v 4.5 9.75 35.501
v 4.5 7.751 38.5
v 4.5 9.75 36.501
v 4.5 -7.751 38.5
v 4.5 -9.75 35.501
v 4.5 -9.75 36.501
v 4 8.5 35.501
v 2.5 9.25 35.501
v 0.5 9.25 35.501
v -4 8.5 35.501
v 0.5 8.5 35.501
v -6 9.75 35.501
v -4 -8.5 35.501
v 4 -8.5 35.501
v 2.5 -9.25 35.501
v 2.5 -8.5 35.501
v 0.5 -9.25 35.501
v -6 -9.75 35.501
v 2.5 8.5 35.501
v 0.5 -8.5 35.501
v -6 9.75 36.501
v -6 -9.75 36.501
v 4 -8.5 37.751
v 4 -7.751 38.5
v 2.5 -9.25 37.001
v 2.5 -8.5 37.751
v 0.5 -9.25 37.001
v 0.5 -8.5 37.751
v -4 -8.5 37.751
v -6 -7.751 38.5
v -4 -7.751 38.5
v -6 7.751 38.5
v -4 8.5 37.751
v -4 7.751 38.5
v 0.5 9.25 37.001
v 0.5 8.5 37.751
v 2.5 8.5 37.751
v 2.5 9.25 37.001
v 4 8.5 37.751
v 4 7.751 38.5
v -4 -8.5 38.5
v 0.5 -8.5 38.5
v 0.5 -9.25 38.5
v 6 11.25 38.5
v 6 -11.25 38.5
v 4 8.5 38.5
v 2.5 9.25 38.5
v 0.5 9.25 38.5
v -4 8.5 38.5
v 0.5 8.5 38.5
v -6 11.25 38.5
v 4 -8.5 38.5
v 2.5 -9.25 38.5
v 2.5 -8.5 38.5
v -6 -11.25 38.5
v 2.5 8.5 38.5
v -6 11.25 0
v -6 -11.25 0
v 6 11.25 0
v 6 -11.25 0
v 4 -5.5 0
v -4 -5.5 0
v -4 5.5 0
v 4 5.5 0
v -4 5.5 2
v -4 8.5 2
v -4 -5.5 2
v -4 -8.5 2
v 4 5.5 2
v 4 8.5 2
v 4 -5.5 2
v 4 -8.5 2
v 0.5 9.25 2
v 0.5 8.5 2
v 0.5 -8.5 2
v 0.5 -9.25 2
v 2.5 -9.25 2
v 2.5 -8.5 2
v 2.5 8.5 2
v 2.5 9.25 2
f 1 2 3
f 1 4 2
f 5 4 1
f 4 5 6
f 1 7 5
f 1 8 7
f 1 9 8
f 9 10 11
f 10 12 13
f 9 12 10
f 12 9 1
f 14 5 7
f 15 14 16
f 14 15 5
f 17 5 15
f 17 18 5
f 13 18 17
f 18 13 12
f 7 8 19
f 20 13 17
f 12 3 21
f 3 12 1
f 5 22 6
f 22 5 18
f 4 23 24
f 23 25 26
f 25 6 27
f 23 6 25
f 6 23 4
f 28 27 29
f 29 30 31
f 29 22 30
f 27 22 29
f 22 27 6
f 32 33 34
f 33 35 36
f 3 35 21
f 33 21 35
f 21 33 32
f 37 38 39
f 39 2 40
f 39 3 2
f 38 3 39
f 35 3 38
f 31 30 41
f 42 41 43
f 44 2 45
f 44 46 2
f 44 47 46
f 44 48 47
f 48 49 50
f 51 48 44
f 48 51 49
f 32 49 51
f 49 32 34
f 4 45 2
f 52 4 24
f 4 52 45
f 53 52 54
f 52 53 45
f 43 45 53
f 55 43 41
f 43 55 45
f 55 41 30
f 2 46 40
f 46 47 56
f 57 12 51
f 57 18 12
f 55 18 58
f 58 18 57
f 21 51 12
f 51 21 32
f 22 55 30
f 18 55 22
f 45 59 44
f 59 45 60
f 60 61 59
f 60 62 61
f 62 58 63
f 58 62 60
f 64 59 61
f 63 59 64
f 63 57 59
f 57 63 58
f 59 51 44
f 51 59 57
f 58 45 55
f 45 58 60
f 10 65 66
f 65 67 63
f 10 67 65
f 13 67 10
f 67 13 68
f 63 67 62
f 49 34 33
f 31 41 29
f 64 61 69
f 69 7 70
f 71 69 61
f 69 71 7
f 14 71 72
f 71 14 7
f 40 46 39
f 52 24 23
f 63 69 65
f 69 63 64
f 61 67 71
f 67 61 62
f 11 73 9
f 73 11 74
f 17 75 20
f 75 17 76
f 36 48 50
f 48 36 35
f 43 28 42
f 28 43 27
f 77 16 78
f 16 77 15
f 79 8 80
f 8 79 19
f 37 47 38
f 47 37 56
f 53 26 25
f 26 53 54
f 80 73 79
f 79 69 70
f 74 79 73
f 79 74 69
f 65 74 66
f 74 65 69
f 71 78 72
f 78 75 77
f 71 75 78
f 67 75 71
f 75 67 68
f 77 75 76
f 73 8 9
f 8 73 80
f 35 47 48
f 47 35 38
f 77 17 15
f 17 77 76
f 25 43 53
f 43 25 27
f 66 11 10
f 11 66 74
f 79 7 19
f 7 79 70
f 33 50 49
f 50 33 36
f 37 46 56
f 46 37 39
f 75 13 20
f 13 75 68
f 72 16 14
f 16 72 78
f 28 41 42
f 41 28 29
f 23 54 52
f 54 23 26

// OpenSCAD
// Which one would you like to see?
part = "case"; // [case:the case without cap,cap:the cap for the case]

// The width of the (e. g. Arduino) board which should fit into the case (all parameters are in mm)
board_width = 18.5;


// The length of the (e. g. Arduino) board which should fit into the case
board_length = 33.5;

// The thickness of the (e. g. Arduino) board which should fit into the case, must be >= 0. (its used for the thickness of the slots, it is not the size of the inner space
board_thickness = 2.0;

// the board can slide into the case. Therefore there are slots on both sides of the case. If you want the complete inner of the case with same width as above given board with: set this parameter to 0
board_slot_depth = .75;

// if the board should not be centered in the case, you can add an offset here. Positive values give a lower position of the slots
board_out_of_center_Z = 1.5;



// the inner height of the case
case_inner_height = 8;

// on the front there is a centered opening. Typically this is used for connecting the usb conncetor of the board. Set to 0 if you don't need a openening there
USB_openening_height = 8;
USB_openening_width = 11;



// the cap is made a little bit smaller and thinner than the cap slot in the case, must be >= 0 (in mm)
gap = 0.2;

// in the cap there is a slot, e. g. for passing a wire through the cap. Set it to 0 if you do not need a slot
cap_Gap_width =1.7;

// the height is measured above the board in the case. The slot ends at the lower end of the cap
cap_gap_height = 3; 


module dummy() {
    //end of configurable section of customizer
}

houseTS = 2;
houseTT = 2;
capT = 3;
capSkewed = 2;
capWT = 1.5;


houseL = board_length + houseTT + capT;
houseW = board_width + 2 * houseTS;
houseH = case_inner_height + 2 * houseTS;

module mycube(pos,center=[false,false,false])
{   
    translate([center[0]?-pos[0]/2:0,center[1]?-pos[1]/2:0,center[2]?-pos[2]/2:0])cube(pos);
}


module cap(gap = 0) {
    difference() {
        union() {
            translate([0,0,(houseTS-.5)/2+(gap==0?1:0)]) intersection() {
                mycube([capT,houseW-2*capWT-2*gap,case_inner_height+.5+houseTS+2*(gap==0?1:0)],[false,true,true]) ;
                rotate([45,0,0]) rotate([0,90,0]) cylinder(capT-gap,sqrt(2)*(houseW/2-capWT+capT-capSkewed-gap),sqrt(2)*(houseW/2-capWT-capSkewed-gap),$fn=4); 
            }
        }
        if(gap!=0) translate([0,0,-case_inner_height-board_out_of_center_Z/2+cap_gap_height])mycube([capT+2,cap_Gap_width,case_inner_height],[false,true,false]);
    }
}


PartIsCap = (part == "cap");

rotate([0,-90,0]) if(!PartIsCap)
difference() {
    mycube([houseL,houseW,houseH],[false,true,true]);
    translate([-1,0,0]) mycube([2+houseTS,USB_openening_width,USB_openening_height],[false,true,true]);
    translate([houseTS,0,-board_out_of_center_Z]) mycube([houseL,board_width,board_thickness],[false,true,true]);
    translate([houseTS,0,0])mycube([houseL,board_width-2*board_slot_depth,case_inner_height],[false,true,true]);
    translate([houseTT+board_length+0.001,0,0]) cap(0);
}
else
    translate([-15,0,0]) cap(.2);
